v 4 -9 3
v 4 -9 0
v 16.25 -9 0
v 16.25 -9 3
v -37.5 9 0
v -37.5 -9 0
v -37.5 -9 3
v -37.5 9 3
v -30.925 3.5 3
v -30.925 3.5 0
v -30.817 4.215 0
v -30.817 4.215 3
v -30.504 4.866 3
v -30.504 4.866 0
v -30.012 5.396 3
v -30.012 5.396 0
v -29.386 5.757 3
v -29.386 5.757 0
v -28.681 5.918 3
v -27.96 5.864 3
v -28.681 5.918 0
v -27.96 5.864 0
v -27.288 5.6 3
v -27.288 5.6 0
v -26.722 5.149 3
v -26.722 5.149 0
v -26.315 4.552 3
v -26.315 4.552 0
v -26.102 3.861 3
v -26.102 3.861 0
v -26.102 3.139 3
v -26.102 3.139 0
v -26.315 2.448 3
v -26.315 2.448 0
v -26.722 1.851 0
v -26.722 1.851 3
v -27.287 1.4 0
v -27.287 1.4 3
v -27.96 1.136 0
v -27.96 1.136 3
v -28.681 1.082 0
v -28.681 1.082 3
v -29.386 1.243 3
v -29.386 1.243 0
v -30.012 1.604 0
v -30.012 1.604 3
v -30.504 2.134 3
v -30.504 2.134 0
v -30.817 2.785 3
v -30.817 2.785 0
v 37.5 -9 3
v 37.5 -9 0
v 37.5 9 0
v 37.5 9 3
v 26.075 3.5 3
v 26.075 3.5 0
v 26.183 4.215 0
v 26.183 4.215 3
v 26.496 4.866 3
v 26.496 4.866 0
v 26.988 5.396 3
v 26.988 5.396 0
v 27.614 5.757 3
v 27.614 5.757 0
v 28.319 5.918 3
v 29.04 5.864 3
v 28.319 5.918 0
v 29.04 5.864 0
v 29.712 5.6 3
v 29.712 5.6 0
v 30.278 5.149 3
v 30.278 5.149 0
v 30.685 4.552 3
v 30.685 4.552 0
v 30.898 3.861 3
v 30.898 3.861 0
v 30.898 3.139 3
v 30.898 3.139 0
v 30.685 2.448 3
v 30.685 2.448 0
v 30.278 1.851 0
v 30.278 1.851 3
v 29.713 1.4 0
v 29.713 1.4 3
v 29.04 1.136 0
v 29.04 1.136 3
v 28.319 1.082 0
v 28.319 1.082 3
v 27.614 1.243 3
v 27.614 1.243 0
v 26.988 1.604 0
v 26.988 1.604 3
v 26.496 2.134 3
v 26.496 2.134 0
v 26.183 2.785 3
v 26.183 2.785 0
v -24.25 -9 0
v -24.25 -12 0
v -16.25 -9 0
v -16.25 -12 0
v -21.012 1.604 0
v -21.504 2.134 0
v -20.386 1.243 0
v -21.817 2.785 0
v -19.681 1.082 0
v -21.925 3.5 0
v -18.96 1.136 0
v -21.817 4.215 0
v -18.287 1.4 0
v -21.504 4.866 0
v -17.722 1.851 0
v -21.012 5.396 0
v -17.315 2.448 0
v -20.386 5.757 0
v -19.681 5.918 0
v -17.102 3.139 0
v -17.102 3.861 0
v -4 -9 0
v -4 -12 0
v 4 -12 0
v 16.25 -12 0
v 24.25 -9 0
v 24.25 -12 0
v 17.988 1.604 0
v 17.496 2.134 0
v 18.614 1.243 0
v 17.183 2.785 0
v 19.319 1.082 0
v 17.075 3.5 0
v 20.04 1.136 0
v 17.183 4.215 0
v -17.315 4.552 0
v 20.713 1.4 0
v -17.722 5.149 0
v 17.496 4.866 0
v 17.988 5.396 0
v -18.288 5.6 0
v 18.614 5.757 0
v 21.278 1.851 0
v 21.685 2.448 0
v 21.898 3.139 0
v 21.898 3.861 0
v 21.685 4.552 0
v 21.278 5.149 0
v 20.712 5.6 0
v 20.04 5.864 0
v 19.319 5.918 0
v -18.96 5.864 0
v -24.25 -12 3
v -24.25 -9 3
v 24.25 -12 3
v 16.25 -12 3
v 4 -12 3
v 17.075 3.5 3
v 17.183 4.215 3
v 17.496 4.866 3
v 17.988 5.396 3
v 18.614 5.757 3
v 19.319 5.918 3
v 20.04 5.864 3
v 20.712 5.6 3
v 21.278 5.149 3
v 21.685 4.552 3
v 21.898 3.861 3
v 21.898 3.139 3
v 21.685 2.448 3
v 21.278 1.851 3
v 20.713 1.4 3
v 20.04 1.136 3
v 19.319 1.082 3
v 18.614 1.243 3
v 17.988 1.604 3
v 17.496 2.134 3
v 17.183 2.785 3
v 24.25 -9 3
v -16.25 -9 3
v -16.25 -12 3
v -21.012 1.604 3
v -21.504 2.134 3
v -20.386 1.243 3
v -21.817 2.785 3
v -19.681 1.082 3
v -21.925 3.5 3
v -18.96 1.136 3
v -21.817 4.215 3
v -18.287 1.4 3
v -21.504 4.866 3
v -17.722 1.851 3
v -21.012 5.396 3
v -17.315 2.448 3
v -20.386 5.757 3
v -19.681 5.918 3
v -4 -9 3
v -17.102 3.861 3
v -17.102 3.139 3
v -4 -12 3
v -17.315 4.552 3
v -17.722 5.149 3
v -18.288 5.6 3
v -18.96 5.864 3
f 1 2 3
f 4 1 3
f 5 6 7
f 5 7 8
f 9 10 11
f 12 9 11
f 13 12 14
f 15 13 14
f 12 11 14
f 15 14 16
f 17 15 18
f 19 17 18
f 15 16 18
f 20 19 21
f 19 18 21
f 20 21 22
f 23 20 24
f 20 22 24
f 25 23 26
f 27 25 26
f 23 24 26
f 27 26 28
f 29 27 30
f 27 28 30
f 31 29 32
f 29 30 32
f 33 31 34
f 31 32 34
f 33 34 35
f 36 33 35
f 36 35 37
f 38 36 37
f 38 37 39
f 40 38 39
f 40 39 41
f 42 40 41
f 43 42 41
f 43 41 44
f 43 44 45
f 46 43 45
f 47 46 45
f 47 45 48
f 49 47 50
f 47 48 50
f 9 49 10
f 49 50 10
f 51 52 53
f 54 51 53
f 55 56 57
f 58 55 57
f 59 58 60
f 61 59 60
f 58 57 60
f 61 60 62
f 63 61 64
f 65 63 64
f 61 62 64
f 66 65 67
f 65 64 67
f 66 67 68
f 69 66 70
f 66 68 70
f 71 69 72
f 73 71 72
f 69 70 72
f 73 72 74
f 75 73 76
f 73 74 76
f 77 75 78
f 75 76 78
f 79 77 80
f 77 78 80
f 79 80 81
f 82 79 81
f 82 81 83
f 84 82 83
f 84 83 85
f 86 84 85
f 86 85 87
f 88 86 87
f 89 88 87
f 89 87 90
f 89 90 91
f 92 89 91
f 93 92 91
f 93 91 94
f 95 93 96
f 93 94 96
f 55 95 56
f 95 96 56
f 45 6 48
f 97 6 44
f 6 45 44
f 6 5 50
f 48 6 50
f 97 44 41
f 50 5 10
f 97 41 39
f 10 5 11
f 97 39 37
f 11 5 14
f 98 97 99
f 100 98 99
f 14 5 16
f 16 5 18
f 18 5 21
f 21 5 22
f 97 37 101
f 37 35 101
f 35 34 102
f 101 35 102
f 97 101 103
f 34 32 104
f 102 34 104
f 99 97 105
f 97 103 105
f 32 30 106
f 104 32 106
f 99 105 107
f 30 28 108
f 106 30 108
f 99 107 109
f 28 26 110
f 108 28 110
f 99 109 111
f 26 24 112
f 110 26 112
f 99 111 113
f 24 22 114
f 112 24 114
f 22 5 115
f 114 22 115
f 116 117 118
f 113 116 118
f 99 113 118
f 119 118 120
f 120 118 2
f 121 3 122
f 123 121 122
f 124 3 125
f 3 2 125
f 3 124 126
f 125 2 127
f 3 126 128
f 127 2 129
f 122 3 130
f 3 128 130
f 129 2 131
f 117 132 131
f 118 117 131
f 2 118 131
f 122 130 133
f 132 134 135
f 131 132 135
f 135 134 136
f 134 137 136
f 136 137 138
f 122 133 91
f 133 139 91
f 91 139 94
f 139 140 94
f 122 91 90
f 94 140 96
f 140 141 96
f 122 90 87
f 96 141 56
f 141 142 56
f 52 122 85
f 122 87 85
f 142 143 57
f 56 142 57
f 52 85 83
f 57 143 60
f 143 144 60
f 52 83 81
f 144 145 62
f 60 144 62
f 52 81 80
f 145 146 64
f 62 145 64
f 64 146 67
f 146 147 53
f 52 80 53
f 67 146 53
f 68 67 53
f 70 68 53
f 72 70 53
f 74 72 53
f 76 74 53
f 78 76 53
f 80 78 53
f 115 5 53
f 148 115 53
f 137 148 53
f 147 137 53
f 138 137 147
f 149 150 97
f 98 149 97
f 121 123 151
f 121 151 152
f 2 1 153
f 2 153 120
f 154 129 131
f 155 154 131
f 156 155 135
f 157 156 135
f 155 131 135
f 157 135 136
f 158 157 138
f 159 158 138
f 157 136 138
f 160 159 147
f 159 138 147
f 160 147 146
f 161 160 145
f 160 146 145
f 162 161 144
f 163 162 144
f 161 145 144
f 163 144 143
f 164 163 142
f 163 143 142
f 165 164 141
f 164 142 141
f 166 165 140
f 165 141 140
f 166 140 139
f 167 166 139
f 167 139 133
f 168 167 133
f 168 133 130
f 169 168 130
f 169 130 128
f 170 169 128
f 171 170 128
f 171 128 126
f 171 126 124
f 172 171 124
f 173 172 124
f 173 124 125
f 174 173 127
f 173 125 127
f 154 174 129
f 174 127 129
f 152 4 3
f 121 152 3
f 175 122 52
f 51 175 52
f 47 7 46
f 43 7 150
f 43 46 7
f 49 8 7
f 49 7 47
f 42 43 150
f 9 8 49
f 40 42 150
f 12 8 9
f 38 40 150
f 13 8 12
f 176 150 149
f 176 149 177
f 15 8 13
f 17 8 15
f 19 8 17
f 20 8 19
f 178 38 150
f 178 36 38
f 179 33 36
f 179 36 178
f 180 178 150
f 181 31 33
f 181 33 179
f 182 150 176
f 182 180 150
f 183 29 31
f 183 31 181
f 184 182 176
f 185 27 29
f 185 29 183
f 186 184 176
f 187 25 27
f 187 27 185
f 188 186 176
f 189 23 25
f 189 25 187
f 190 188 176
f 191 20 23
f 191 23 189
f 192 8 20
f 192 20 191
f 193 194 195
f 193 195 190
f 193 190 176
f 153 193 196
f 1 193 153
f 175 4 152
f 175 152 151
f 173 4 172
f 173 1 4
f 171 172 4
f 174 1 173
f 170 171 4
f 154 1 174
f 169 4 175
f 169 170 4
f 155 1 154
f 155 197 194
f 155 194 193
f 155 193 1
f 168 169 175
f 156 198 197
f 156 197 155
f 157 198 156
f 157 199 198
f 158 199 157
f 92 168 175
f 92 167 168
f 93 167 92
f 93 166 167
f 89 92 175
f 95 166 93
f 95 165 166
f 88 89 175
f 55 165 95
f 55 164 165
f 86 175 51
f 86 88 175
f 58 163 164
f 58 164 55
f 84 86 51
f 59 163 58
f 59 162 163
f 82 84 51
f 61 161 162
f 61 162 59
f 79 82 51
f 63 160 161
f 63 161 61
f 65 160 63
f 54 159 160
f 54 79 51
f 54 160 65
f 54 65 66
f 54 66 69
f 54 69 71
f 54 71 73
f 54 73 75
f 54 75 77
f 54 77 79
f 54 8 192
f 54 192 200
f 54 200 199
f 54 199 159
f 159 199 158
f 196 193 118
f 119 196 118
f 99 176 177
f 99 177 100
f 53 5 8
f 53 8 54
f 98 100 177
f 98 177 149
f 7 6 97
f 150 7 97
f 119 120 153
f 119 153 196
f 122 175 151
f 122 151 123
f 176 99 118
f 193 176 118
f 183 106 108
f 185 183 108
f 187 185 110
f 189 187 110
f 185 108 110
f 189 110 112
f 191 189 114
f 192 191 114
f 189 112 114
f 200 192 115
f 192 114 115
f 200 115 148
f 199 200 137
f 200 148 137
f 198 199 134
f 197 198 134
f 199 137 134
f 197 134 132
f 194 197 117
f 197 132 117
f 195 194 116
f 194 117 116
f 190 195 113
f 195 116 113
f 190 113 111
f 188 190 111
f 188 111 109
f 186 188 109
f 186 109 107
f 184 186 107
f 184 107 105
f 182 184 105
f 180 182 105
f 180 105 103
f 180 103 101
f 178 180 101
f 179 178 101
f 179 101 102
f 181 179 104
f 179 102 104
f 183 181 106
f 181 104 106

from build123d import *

# Parameters (mm, degrees)
SKETCH1_W           = 75
SKETCH1_H           = 18
BOSS_EXTRUDE1_DEPTH = 3
SKETCH2_W           = 8
SKETCH2_H           = 3
BOSS_EXTRUDE2_DEPTH = 3
SKETCH3_R           = 2.425
CUT_EXTRUDE1_DEPTH  = 3


with BuildPart() as part:
    # Sketch1 → Boss-Extrude1 (new body)
    with BuildSketch(Plane.XY):
        Rectangle(SKETCH1_W, SKETCH1_H)
    extrude(amount=BOSS_EXTRUDE1_DEPTH)

    # Sketch2 → Boss-Extrude2 (add)
    with BuildSketch(Plane(origin=(0, -9, 0), x_dir=(-1, 0, 0), z_dir=(0, -1, 0))):
        with Locations((-20.25, -1.5)):
            Rectangle(SKETCH2_W, SKETCH2_H)
        with Locations((0, -1.5)):
            Rectangle(SKETCH2_W, SKETCH2_H)
        with Locations((20.25, -1.5)):
            Rectangle(SKETCH2_W, SKETCH2_H)
    extrude(amount=BOSS_EXTRUDE2_DEPTH)

    # Sketch3 → Cut-Extrude1 (cut)
    with BuildSketch(Plane(origin=(0, 0, 0), x_dir=(-1, 0, 0), z_dir=(0, 0, -1))):
        with Locations((-28.5, 3.5)):
            Circle(SKETCH3_R)
        with Locations((28.5, 3.5)):
            Circle(SKETCH3_R)
        with Locations((-19.5, 3.5)):
            Circle(SKETCH3_R)
        with Locations((19.5, 3.5)):
            Circle(SKETCH3_R)
    extrude(amount=-CUT_EXTRUDE1_DEPTH, mode=Mode.SUBTRACT)


solid = part.part
